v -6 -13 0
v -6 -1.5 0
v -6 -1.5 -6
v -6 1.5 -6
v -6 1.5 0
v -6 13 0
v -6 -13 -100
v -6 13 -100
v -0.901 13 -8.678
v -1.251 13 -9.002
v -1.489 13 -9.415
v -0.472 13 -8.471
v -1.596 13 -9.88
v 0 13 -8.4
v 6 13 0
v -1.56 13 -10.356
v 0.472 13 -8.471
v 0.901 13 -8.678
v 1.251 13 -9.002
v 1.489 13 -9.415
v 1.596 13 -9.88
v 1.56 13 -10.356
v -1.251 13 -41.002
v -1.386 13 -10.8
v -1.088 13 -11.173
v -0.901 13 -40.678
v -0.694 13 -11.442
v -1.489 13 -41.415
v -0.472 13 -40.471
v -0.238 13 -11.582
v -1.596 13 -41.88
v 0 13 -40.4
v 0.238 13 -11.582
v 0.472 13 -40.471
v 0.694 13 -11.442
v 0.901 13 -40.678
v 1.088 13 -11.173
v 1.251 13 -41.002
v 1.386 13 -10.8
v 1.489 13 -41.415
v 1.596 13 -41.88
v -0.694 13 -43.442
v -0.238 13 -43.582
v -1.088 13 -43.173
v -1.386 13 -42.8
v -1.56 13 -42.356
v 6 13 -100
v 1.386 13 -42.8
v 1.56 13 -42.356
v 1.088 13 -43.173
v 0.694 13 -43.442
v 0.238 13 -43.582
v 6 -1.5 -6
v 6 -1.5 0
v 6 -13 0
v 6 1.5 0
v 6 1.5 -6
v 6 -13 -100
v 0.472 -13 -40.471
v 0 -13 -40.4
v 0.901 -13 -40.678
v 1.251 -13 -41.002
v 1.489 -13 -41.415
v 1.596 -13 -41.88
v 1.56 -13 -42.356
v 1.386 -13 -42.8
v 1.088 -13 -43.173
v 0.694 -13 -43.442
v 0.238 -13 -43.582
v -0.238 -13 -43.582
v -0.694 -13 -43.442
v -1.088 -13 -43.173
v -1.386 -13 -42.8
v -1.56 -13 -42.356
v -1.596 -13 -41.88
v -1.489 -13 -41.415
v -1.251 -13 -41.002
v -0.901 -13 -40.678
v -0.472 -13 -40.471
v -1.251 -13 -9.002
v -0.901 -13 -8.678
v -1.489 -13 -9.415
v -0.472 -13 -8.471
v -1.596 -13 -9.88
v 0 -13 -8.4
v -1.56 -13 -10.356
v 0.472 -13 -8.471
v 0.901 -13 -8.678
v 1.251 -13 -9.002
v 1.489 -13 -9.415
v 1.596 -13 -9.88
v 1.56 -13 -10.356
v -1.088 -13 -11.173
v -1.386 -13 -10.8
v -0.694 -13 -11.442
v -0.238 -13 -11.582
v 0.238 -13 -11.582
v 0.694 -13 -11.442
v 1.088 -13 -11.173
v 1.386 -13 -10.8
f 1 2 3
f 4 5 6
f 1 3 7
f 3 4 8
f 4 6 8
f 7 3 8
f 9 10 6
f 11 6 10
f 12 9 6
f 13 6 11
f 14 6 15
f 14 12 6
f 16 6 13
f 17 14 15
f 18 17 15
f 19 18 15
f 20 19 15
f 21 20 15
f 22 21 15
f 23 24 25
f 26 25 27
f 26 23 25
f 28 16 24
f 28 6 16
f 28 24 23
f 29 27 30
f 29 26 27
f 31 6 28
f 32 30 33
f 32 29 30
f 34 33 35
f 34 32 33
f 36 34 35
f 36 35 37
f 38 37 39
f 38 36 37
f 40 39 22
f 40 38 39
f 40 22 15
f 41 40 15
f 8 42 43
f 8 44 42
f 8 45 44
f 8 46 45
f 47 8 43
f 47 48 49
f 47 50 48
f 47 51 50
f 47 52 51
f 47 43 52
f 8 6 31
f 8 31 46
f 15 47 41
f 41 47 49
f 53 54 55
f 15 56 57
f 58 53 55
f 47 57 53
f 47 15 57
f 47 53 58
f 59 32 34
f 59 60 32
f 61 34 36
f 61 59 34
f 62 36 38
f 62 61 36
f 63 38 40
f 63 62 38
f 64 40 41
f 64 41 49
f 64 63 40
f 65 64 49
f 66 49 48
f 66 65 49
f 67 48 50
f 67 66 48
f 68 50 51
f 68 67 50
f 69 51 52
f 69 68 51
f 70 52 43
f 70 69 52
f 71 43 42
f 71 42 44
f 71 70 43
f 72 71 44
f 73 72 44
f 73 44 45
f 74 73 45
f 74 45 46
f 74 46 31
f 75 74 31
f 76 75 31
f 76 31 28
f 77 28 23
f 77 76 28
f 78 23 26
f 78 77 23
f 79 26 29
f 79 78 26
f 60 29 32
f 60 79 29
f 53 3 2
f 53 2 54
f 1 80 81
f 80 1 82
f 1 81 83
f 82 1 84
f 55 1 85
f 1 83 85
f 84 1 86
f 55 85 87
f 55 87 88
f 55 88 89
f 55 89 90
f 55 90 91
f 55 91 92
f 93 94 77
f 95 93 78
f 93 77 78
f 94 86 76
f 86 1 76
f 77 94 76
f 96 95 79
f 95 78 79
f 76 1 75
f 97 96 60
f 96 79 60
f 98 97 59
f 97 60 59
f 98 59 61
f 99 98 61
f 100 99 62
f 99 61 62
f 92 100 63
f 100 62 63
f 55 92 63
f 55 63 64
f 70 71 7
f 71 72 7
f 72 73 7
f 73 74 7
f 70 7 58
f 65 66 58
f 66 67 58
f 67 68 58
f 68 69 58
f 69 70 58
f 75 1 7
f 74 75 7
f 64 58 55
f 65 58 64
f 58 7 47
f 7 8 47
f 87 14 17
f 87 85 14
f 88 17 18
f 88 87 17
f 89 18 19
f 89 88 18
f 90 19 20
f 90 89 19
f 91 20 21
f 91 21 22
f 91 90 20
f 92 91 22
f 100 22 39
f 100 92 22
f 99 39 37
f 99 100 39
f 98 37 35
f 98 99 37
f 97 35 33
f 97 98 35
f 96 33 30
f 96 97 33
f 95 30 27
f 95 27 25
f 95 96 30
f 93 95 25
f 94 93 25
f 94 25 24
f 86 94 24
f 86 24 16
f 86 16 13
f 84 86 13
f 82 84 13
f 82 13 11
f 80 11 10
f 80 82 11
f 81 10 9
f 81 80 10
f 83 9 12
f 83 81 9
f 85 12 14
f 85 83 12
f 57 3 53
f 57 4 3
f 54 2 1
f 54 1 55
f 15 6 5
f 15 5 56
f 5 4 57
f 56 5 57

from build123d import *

# Parameters (mm, degrees)
SKETCH1_W          = 12
SKETCH1_H          = 100
SKETCH1_R          = 1.6
EXTRUDE1_DEPTH     = 13
SKETCH2_W          = 12
SKETCH2_H          = 6
CUT_EXTRUDE1_DEPTH = 1.5


with BuildPart() as part:
    # Sketch1 → Extrude1 (new body, symmetric)
    with BuildSketch(Plane(origin=(0, 0, 0), x_dir=(1, 0, 0), z_dir=(0, 1, 0))):
        with Locations((0, 50)):
            Rectangle(SKETCH1_W, SKETCH1_H)
        with Locations(Location((0, 10, 0), (0, 0, 270))):  # turned: the seam where the file's is
            Circle(SKETCH1_R, mode=Mode.SUBTRACT)
        with Locations(Location((0, 42, 0), (0, 0, 270))):  # turned: the seam where the file's is
            Circle(SKETCH1_R, mode=Mode.SUBTRACT)
    extrude(amount=EXTRUDE1_DEPTH, both=True)

    # Sketch2 → Cut-Extrude1 (cut, symmetric)
    with BuildSketch(Plane(origin=(0, 0, 0), x_dir=(1, 0, 0), z_dir=(0, 1, 0))):
        with Locations((0, 3)):
            Rectangle(SKETCH2_W, SKETCH2_H)
    extrude(amount=CUT_EXTRUDE1_DEPTH, both=True, mode=Mode.SUBTRACT)


solid = part.part
